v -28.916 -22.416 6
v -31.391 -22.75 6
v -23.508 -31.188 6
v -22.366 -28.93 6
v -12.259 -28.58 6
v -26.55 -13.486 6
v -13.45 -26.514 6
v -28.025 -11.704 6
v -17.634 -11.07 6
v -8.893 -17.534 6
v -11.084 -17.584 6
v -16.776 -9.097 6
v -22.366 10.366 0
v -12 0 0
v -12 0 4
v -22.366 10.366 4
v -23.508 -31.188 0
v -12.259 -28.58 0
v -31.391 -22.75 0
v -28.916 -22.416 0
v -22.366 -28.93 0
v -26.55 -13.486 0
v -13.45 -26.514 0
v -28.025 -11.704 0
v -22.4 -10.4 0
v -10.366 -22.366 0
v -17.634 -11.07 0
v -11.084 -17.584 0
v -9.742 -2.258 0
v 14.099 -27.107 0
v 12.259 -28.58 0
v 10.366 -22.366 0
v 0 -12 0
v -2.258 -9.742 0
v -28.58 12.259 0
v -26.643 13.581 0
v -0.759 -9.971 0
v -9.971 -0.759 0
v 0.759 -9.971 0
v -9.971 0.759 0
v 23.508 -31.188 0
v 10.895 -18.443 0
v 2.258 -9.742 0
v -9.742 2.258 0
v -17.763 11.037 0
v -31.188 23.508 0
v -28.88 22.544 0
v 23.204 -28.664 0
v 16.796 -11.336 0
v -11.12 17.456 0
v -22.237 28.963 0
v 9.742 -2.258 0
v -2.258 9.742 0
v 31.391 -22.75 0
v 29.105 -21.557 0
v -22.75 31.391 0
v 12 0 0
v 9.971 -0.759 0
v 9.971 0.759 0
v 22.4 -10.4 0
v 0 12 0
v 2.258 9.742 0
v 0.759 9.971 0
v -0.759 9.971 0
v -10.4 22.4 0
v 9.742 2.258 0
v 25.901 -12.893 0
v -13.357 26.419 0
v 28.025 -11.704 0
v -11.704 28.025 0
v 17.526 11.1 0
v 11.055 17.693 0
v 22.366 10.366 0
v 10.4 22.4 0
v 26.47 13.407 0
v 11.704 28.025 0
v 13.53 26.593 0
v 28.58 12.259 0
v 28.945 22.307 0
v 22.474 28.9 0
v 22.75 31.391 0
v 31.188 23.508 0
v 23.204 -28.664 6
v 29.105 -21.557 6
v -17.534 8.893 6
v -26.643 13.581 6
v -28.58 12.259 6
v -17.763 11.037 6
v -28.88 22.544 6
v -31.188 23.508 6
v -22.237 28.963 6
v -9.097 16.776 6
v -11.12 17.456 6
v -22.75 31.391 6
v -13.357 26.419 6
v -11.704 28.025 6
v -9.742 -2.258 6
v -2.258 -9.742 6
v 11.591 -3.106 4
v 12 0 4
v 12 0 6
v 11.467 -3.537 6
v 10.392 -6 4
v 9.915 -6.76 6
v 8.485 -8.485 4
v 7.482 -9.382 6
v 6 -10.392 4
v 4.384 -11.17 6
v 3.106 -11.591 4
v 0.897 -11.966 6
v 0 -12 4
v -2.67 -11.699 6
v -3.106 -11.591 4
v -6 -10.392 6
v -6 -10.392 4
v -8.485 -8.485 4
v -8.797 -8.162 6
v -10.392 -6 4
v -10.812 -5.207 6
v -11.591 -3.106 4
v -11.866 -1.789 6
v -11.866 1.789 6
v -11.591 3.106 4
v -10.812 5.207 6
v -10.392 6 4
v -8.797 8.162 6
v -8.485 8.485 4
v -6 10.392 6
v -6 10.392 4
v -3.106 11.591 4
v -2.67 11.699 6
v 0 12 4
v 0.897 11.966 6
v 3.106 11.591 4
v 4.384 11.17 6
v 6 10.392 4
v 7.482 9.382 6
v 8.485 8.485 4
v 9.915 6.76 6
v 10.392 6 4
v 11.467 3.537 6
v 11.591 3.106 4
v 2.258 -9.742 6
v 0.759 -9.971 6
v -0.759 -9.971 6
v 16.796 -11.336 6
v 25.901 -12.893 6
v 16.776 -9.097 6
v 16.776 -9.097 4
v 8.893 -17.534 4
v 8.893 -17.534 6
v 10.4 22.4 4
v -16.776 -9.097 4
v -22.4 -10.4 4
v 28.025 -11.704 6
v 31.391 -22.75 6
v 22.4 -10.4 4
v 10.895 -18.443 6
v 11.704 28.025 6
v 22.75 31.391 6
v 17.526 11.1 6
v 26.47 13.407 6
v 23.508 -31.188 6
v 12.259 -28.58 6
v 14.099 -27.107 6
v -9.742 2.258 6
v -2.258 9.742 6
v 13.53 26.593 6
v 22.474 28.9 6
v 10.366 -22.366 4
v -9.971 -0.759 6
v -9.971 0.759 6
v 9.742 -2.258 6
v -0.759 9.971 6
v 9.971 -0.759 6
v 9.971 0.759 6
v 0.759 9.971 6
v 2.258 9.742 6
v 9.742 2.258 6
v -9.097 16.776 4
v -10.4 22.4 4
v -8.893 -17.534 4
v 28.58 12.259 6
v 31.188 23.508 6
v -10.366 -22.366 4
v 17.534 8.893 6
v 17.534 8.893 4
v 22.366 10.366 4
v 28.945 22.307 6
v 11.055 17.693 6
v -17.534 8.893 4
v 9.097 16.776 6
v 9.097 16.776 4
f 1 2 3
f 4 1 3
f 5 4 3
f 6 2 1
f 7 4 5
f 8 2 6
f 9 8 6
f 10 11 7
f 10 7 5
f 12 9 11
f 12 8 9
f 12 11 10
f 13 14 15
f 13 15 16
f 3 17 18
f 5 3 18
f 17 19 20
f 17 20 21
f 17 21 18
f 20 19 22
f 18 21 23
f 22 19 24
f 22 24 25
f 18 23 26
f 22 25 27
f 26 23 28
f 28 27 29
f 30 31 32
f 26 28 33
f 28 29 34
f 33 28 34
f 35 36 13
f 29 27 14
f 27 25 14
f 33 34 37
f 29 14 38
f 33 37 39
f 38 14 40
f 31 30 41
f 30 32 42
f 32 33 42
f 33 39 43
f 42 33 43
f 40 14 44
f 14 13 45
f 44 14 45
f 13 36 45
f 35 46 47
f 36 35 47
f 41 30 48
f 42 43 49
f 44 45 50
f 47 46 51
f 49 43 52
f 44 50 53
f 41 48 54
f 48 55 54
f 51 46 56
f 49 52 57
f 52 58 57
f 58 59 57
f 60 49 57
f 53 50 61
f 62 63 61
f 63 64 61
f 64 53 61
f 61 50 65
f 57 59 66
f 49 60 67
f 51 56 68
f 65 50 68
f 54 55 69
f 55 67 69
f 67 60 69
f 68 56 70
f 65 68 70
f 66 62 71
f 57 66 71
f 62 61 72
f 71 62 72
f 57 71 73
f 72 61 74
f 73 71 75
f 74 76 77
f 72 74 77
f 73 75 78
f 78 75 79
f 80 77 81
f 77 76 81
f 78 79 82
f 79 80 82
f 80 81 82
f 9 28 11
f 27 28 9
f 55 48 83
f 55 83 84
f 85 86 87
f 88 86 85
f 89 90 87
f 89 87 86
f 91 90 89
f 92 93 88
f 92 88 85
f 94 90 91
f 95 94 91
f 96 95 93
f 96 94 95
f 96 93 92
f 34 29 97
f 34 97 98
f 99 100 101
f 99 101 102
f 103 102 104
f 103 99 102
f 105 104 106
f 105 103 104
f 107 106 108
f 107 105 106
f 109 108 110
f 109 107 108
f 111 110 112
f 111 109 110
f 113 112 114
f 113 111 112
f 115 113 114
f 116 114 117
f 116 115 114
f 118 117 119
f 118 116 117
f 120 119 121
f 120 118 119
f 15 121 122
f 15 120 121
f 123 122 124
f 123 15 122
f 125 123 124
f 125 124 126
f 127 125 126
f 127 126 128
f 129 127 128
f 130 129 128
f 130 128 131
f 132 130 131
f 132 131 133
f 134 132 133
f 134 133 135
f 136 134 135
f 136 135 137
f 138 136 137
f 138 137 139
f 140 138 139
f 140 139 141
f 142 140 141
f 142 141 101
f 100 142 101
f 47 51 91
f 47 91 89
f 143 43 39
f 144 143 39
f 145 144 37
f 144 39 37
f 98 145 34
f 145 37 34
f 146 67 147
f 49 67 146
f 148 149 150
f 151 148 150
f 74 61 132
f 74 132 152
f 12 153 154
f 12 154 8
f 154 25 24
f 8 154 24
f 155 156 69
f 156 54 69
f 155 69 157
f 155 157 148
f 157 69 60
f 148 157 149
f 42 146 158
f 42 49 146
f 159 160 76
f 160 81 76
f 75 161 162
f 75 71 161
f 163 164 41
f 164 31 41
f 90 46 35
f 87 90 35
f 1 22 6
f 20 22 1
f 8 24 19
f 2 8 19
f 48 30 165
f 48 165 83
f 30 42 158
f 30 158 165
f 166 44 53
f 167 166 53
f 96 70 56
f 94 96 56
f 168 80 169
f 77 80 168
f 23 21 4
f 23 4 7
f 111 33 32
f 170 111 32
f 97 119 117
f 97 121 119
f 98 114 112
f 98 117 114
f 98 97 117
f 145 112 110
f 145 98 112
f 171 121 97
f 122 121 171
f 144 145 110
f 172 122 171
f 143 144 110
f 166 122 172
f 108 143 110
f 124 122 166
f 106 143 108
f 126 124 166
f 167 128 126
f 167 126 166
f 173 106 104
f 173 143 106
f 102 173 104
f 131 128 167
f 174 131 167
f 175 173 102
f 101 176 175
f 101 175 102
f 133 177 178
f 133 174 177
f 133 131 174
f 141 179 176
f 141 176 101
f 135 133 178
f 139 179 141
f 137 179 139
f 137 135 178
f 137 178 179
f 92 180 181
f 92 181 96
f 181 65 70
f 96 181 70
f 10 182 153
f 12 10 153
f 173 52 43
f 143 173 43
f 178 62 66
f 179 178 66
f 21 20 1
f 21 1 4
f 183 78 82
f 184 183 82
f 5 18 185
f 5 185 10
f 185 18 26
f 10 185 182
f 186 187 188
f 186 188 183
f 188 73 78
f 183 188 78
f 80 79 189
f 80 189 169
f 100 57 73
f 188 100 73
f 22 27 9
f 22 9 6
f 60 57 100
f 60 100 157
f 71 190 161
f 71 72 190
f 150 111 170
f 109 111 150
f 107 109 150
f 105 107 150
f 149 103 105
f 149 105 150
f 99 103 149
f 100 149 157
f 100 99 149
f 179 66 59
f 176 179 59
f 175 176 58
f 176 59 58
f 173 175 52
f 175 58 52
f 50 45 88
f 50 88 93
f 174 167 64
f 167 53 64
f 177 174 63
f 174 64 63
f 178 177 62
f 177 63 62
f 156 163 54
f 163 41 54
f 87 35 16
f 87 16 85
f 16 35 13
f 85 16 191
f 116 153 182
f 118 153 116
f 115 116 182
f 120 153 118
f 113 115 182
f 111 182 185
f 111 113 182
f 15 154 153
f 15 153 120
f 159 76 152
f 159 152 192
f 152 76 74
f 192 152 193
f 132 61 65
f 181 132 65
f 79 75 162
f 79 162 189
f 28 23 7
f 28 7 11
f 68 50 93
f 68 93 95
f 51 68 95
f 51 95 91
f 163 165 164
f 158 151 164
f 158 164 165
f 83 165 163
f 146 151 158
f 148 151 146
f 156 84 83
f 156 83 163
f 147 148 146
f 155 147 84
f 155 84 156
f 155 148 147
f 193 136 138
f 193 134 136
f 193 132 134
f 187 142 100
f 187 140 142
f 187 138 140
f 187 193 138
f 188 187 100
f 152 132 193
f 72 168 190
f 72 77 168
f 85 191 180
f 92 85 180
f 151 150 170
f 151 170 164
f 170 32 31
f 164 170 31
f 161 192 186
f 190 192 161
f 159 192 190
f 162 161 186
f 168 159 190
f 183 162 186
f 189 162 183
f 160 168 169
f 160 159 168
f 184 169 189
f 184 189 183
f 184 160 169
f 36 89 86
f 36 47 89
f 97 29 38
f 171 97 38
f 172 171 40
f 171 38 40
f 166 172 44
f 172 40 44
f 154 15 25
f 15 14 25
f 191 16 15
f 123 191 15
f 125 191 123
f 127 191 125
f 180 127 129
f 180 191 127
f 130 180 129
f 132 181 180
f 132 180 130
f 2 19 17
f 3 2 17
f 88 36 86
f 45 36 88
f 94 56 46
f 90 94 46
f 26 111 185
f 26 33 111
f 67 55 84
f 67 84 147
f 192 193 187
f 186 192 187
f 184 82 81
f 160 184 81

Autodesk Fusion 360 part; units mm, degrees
sketch "Sketch1" plane through (0, 0, 0) normal (0, 0, 1) x (1, 0, 0)
  circle A0 centre (0, 0) radius 12
  circle A1 centre (0, 0) radius 10
  line L0 (12, 0) -> (0, -12)
  line L1 (-12, 0) -> (0, -12)
  line L2 (-12, 0) -> (0, 12)
  line L3 (0, 12) -> (12, 0)
  line L4 (0, 12) -> (14.1421, 26.1421)
  line L5 (12, 0) -> (26.1421, 14.1421)
  line L6 (26.1421, 14.1421) -> (14.1421, 26.1421)
  line L7 (12, 0) -> (26.1421, -14.1421)
  line L8 (0, -12) -> (14.1421, -26.1421)
  line L9 (14.1421, -26.1421) -> (26.1421, -14.1421)
  line L10 (0, -12) -> (-14.1421, -26.1421)
  line L11 (-12, 0) -> (-26.1421, -14.1421)
  line L12 (-26.1421, -14.1421) -> (-14.1421, -26.1421)
  line L13 (0, 12) -> (-14.1421, 26.1421)
  line L14 (-12, 0) -> (-26.1421, 14.1421)
  line L15 (-26.1421, 14.1421) -> (-14.1421, 26.1421)
  line L16 (16.7761, -9.0966) -> (8.8934, -17.5344)
  line L17 (8.8934, -17.5344) -> (12.2594, -28.5799)
  line L18 (12.2594, -28.5799) -> (23.5081, -31.1876)
  line L19 (23.5081, -31.1876) -> (31.3908, -22.7498)
  line L20 (31.3908, -22.7498) -> (28.0248, -11.7043)
  line L21 (28.0248, -11.7043) -> (16.7761, -9.0966)
  line L22 (-28.0248, -11.7043) -> (-31.3908, -22.7498)
  line L23 (-31.3908, -22.7498) -> (-23.5081, -31.1876)
  line L24 (-23.5081, -31.1876) -> (-12.2594, -28.5799)
  line L25 (-12.2594, -28.5799) -> (-8.8934, -17.5344)
  line L26 (-8.8934, -17.5344) -> (-16.7761, -9.0966)
  line L27 (-16.7761, -9.0966) -> (-28.0248, -11.7043)
  line L28 (-11.7043, 28.0248) -> (-22.7498, 31.3908)
  line L29 (-22.7498, 31.3908) -> (-31.1876, 23.5081)
  line L30 (-31.1876, 23.5081) -> (-28.5799, 12.2594)
  line L31 (-28.5799, 12.2594) -> (-17.5344, 8.8934)
  line L32 (-17.5344, 8.8934) -> (-9.0966, 16.7761)
  line L33 (-9.0966, 16.7761) -> (-11.7043, 28.0248)
  line L34 (9.0966, 16.7761) -> (17.5344, 8.8934)
  line L35 (17.5344, 8.8934) -> (28.5799, 12.2594)
  line L36 (28.5799, 12.2594) -> (31.1876, 23.5081)
  line L37 (31.1876, 23.5081) -> (22.7498, 31.3908)
  line L38 (22.7498, 31.3908) -> (11.7043, 28.0248)
  line L39 (11.7043, 28.0248) -> (9.0966, 16.7761)
  point P0 (20.1421, -20.1421)
  point P1 (-20.1421, -20.1421)
  point P2 (-20.1421, 20.1421)
  point P3 (20.1421, 20.1421)
  dimension "d2" = 20
  dimension "d3" = 20
  dimension "d4" = 20
  dimension "d5" = 20
  dimension "d6" = 20
  dimension "d7" = 20
  dimension "d8" = 20
  dimension "d9" = 20
  dimension "d10" = 10
  dimension "d11" = 10
  dimension "d12" = 10
  dimension "d13" = 10
sketch "Sketch2" plane through (0, 0, 0) normal (0, 0, 1) x (1, 0, 0)
  line L0 (-13.3568, 26.4188) -> (-22.2373, 28.9626)
  line L1 (-22.2373, 28.9626) -> (-28.8805, 22.5437)
  line L2 (-28.8805, 22.5437) -> (-26.6432, 13.5812)
  line L3 (-26.6432, 13.5812) -> (-17.7627, 11.0374)
  line L4 (-17.7627, 11.0374) -> (-11.1195, 17.4563)
  line L5 (-11.1195, 17.4563) -> (-13.3568, 26.4188)
  line L6 (17.5255, 11.1) -> (26.4704, 13.407)
  line L7 (26.4704, 13.407) -> (28.9449, 22.307)
  line L8 (28.9449, 22.307) -> (22.4745, 28.9)
  line L9 (22.4745, 28.9) -> (13.5296, 26.593)
  line L10 (13.5296, 26.593) -> (11.0551, 17.693)
  line L11 (11.0551, 17.693) -> (17.5255, 11.1)
  line L12 (10.8946, -18.4429) -> (14.0988, -27.107)
  line L13 (14.0988, -27.107) -> (23.2042, -28.6641)
  line L14 (23.2042, -28.6641) -> (29.1054, -21.5571)
  line L15 (29.1054, -21.5571) -> (25.9012, -12.893)
  line L16 (25.9012, -12.893) -> (16.7958, -11.3359)
  line L17 (16.7958, -11.3359) -> (10.8946, -18.4429)
  line L18 (-17.6342, -11.0705) -> (-26.5503, -13.4864)
  line L19 (-26.5503, -13.4864) -> (-28.9161, -22.4159)
  line L20 (-28.9161, -22.4159) -> (-22.3658, -28.9295)
  line L21 (-22.3658, -28.9295) -> (-13.4497, -26.5136)
  line L22 (-13.4497, -26.5136) -> (-11.0839, -17.5841)
  line L23 (-11.0839, -17.5841) -> (-17.6342, -11.0705)
  point P0 (-20, 20)
  point P1 (20, 20)
  point P2 (20, -20)
  point P3 (-20, -20)
  dimension "d14" = 8
  dimension "d15" = 8
  dimension "d16" = 8
  dimension "d17" = 8
extrude "Extrude1" add sketch "Sketch2" sketch "Sketch1" along normal blind 6 contours L0 L1 L2 L3 L4 L5 | L6 L7 L8 L9 L10 L11 | L18 L19 L20 L21 L22 L23 of sketch 2 contours L4 L5 L6 L34 L35 L39 | L4 L5 L6 L35 L36 L37 L38 L39 | L7 L8 L9 L17 L18 L19 L20 L21 | L7 L8 L9 L16 L17 L21 | L13 L14 L15 L31 L32 L33 | L13 L14 L15 L28 L29 L30 L31 L33 | L10 L11 L12 L22 L23 L24 L25 L27 | L10 L11 L12 L25 L26 L27 makes body 1 at (23.8917, -21.0114, 0) makes body 2 at (-17.3295, 22.7697, 0) makes body 3 at (23.824, 21.2641, 0) makes body 4 at (-16.3926, -19.2729, 0)
extrude "Extrude2" add sketch "Sketch1" along normal blind 6 separate body contours A0 A1 L3 | A0 A1 L0 | A1 L0 L3 | A0 A1 L2 | A1 L2 L3 | A1 L0 L1 | A0 A1 L1 | A1 L0 | A1 L3 | A1 L1 L2 | A1 L2 | A1 L1 makes body 5
extrude "Extrude3" add sketch "Sketch1" along normal blind 4 contours A0 L7 L8 L16 L17 L21 | A0 L4 L5 L34 L35 L39 | A0 L13 L14 L31 L32 L33 | A0 L10 L11 L25 L26 L27 bodies 5 1 2 3 4
extrude "Extrude4" cut sketch "Sketch2" along normal blind 6 bodies 5
